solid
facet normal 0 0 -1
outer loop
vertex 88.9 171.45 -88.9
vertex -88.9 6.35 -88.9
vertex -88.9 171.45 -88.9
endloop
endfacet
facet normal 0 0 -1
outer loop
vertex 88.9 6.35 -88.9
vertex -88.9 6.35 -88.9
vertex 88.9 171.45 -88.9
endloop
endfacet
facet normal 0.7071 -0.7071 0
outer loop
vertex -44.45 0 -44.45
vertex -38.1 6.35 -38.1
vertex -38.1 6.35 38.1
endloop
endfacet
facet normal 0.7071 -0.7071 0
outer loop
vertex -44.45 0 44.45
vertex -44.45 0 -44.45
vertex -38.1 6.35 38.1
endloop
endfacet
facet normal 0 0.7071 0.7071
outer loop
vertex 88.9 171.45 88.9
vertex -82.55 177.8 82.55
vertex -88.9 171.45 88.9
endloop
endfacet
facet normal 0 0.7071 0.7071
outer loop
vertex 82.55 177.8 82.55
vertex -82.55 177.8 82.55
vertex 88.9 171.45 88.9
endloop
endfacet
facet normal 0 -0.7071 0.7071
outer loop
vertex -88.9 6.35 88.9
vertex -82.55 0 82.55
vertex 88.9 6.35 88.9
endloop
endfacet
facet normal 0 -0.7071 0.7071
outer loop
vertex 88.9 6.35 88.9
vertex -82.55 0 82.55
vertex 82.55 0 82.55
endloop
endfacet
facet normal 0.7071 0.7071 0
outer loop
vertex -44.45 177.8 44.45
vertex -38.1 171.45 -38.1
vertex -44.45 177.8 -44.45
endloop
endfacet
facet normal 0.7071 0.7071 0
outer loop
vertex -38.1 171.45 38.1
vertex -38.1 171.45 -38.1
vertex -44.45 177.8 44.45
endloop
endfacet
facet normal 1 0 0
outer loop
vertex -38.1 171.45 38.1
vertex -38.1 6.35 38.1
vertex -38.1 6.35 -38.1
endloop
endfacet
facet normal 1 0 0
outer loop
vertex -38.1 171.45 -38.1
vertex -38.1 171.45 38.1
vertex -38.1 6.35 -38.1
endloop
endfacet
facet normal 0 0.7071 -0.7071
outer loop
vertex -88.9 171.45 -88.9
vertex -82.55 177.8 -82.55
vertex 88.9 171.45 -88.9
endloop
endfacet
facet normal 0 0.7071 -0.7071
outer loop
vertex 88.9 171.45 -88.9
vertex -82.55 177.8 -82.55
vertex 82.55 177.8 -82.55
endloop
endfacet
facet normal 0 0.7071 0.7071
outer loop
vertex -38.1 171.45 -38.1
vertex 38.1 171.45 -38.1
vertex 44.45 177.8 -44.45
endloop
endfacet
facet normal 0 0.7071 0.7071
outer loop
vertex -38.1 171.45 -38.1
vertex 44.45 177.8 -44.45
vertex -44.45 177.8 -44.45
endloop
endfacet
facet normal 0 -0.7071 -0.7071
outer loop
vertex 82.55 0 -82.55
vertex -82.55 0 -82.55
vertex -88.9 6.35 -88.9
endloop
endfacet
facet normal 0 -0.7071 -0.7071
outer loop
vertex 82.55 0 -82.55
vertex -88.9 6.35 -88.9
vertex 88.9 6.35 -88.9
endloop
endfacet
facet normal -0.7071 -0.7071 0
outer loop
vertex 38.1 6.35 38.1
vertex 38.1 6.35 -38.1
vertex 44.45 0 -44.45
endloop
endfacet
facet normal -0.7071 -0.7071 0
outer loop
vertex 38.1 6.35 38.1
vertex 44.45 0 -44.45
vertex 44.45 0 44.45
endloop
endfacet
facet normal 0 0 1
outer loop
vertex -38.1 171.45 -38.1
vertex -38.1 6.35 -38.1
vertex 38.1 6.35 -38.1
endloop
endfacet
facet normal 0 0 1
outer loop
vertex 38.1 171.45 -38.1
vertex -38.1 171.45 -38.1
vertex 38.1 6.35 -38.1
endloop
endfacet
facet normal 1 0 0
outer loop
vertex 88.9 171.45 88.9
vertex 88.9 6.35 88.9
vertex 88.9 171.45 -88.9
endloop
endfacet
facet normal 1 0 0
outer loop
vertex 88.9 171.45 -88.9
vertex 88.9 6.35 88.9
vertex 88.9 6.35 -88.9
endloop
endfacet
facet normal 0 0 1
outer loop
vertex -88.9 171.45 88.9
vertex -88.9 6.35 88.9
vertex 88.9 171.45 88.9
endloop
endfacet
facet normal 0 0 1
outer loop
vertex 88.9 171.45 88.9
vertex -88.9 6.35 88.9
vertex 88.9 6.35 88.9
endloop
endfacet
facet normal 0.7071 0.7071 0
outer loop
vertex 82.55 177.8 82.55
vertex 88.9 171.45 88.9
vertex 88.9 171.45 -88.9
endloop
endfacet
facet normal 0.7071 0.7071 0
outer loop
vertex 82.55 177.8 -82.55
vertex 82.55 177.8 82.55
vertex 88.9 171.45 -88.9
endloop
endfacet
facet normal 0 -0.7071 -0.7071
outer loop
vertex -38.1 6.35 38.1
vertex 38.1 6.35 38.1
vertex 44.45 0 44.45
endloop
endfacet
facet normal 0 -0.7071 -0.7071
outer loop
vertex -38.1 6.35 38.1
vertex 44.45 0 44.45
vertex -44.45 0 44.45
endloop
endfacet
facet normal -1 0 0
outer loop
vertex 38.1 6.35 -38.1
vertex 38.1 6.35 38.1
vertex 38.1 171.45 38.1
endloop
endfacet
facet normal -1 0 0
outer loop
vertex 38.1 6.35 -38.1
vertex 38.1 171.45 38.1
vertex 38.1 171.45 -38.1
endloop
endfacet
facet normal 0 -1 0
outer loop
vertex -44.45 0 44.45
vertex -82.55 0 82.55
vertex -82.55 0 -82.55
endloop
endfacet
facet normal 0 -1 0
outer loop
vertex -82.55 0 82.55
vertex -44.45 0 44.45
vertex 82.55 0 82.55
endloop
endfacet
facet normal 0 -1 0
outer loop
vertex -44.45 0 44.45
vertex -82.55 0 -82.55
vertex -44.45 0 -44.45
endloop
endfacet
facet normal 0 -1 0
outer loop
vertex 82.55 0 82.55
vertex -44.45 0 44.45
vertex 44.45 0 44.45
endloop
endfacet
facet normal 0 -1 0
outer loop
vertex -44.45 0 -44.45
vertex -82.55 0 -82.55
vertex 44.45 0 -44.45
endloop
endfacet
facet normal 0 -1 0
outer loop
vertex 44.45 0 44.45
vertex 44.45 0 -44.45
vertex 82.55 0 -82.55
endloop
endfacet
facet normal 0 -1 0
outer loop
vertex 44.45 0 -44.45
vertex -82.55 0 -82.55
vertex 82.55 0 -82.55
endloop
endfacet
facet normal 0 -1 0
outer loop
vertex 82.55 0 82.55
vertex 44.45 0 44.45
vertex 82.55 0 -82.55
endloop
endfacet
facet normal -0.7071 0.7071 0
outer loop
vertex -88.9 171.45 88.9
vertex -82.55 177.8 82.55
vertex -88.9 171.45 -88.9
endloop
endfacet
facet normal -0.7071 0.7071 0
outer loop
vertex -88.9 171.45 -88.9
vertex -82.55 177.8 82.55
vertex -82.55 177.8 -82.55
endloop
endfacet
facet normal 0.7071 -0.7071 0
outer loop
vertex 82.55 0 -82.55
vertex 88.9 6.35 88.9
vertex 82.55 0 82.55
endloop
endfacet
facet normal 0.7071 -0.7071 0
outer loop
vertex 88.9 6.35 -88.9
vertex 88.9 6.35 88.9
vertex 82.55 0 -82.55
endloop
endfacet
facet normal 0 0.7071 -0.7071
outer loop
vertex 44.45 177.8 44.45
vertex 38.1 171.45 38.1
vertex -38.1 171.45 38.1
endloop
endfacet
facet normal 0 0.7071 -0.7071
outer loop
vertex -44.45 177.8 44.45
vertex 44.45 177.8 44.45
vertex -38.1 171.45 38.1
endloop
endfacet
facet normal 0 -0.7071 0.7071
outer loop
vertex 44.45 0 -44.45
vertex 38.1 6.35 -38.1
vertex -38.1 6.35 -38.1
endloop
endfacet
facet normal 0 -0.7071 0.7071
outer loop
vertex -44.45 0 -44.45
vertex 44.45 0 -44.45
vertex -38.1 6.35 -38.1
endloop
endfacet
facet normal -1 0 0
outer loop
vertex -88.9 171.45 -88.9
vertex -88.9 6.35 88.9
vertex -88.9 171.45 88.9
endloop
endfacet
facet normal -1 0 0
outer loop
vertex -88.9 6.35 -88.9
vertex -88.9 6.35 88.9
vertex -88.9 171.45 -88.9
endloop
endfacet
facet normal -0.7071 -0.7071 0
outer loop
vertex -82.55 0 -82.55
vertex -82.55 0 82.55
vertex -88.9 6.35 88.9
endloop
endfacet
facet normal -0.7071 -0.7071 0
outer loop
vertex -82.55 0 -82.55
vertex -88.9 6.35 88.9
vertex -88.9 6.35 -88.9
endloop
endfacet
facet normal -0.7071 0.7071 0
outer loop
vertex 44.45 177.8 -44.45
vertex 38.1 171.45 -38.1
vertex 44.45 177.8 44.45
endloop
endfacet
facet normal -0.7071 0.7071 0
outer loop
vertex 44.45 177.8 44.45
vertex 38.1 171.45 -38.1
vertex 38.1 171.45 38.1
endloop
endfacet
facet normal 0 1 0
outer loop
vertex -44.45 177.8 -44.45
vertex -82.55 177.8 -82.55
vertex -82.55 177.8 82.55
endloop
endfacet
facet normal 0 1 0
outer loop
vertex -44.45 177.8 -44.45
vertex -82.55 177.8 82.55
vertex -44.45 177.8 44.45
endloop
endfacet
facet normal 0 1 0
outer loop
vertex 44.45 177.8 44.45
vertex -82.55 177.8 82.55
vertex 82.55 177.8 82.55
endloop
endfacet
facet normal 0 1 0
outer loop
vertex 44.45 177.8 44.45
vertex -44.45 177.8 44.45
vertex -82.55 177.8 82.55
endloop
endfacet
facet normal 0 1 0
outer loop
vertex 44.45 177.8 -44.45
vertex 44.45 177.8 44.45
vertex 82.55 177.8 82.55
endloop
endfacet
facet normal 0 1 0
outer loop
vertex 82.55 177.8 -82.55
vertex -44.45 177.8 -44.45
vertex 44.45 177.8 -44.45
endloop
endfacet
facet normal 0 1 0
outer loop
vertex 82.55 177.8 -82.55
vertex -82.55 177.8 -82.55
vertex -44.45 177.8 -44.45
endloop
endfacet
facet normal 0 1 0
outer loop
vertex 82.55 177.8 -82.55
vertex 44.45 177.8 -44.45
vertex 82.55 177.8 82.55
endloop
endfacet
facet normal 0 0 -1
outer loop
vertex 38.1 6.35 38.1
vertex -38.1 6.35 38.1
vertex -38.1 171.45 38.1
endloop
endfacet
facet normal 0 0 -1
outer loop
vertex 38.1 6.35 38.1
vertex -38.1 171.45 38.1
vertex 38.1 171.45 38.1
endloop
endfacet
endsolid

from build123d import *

# Parameters (mm, degrees)
SKETCH2_W               = 177.8
SKETCH2_H               = 177.8
BOSS_EXTRUDE1_DEPTH     = 177.8
CUT_EXTRUDE1_DEPTH      = 218.759638133
CUT_EXTRUDE1_DEPTH_BACK = 218.759638133
SKETCH3_W               = 76.2
SKETCH3_H               = 76.2
CHAMFER1_SIZE           = 6.35


with BuildPart() as part:
    # Sketch2 → Boss-Extrude1 (new body)
    with BuildSketch(Plane(origin=(0, 0, 0), x_dir=(1, 0, 0), z_dir=(0, 1, 0))):
        Rectangle(SKETCH2_W, SKETCH2_H)
    extrude(amount=BOSS_EXTRUDE1_DEPTH)

    # Sketch3 → Cut-Extrude1 (cut, two sides: drawn at the far end of the back side and taken through both)
    with BuildSketch(Plane(origin=(0, 177.8, 0), x_dir=(1, 0, 0), z_dir=(0, 1, 0)).offset(-CUT_EXTRUDE1_DEPTH_BACK)):
        Rectangle(SKETCH3_W, SKETCH3_H)
    extrude(amount=CUT_EXTRUDE1_DEPTH + CUT_EXTRUDE1_DEPTH_BACK, mode=Mode.SUBTRACT)

    # Chamfer1
    chamfer1_edges = [part.edges().sort_by_distance(p)[0] for p in [
        (-88.9, 177.8, 0),
        (0, 177.8, 88.9),
        (38.1, 177.8, 0),
        (38.1, 0, 0),
        (0, 177.8, 38.1),
        (0, 0, 38.1),
        (-38.1, 177.8, 0),
        (-38.1, 0, 0),
        (0, 177.8, -38.1),
        (0, 0, -38.1),
        (88.9, 177.8, 0),
        (0, 0, 88.9),
        (-88.9, 0, 0),
        (0, 0, -88.9),
        (88.9, 0, 0),
        (0, 177.8, -88.9),
    ]]
    chamfer(chamfer1_edges, length=CHAMFER1_SIZE)


solid = part.part
